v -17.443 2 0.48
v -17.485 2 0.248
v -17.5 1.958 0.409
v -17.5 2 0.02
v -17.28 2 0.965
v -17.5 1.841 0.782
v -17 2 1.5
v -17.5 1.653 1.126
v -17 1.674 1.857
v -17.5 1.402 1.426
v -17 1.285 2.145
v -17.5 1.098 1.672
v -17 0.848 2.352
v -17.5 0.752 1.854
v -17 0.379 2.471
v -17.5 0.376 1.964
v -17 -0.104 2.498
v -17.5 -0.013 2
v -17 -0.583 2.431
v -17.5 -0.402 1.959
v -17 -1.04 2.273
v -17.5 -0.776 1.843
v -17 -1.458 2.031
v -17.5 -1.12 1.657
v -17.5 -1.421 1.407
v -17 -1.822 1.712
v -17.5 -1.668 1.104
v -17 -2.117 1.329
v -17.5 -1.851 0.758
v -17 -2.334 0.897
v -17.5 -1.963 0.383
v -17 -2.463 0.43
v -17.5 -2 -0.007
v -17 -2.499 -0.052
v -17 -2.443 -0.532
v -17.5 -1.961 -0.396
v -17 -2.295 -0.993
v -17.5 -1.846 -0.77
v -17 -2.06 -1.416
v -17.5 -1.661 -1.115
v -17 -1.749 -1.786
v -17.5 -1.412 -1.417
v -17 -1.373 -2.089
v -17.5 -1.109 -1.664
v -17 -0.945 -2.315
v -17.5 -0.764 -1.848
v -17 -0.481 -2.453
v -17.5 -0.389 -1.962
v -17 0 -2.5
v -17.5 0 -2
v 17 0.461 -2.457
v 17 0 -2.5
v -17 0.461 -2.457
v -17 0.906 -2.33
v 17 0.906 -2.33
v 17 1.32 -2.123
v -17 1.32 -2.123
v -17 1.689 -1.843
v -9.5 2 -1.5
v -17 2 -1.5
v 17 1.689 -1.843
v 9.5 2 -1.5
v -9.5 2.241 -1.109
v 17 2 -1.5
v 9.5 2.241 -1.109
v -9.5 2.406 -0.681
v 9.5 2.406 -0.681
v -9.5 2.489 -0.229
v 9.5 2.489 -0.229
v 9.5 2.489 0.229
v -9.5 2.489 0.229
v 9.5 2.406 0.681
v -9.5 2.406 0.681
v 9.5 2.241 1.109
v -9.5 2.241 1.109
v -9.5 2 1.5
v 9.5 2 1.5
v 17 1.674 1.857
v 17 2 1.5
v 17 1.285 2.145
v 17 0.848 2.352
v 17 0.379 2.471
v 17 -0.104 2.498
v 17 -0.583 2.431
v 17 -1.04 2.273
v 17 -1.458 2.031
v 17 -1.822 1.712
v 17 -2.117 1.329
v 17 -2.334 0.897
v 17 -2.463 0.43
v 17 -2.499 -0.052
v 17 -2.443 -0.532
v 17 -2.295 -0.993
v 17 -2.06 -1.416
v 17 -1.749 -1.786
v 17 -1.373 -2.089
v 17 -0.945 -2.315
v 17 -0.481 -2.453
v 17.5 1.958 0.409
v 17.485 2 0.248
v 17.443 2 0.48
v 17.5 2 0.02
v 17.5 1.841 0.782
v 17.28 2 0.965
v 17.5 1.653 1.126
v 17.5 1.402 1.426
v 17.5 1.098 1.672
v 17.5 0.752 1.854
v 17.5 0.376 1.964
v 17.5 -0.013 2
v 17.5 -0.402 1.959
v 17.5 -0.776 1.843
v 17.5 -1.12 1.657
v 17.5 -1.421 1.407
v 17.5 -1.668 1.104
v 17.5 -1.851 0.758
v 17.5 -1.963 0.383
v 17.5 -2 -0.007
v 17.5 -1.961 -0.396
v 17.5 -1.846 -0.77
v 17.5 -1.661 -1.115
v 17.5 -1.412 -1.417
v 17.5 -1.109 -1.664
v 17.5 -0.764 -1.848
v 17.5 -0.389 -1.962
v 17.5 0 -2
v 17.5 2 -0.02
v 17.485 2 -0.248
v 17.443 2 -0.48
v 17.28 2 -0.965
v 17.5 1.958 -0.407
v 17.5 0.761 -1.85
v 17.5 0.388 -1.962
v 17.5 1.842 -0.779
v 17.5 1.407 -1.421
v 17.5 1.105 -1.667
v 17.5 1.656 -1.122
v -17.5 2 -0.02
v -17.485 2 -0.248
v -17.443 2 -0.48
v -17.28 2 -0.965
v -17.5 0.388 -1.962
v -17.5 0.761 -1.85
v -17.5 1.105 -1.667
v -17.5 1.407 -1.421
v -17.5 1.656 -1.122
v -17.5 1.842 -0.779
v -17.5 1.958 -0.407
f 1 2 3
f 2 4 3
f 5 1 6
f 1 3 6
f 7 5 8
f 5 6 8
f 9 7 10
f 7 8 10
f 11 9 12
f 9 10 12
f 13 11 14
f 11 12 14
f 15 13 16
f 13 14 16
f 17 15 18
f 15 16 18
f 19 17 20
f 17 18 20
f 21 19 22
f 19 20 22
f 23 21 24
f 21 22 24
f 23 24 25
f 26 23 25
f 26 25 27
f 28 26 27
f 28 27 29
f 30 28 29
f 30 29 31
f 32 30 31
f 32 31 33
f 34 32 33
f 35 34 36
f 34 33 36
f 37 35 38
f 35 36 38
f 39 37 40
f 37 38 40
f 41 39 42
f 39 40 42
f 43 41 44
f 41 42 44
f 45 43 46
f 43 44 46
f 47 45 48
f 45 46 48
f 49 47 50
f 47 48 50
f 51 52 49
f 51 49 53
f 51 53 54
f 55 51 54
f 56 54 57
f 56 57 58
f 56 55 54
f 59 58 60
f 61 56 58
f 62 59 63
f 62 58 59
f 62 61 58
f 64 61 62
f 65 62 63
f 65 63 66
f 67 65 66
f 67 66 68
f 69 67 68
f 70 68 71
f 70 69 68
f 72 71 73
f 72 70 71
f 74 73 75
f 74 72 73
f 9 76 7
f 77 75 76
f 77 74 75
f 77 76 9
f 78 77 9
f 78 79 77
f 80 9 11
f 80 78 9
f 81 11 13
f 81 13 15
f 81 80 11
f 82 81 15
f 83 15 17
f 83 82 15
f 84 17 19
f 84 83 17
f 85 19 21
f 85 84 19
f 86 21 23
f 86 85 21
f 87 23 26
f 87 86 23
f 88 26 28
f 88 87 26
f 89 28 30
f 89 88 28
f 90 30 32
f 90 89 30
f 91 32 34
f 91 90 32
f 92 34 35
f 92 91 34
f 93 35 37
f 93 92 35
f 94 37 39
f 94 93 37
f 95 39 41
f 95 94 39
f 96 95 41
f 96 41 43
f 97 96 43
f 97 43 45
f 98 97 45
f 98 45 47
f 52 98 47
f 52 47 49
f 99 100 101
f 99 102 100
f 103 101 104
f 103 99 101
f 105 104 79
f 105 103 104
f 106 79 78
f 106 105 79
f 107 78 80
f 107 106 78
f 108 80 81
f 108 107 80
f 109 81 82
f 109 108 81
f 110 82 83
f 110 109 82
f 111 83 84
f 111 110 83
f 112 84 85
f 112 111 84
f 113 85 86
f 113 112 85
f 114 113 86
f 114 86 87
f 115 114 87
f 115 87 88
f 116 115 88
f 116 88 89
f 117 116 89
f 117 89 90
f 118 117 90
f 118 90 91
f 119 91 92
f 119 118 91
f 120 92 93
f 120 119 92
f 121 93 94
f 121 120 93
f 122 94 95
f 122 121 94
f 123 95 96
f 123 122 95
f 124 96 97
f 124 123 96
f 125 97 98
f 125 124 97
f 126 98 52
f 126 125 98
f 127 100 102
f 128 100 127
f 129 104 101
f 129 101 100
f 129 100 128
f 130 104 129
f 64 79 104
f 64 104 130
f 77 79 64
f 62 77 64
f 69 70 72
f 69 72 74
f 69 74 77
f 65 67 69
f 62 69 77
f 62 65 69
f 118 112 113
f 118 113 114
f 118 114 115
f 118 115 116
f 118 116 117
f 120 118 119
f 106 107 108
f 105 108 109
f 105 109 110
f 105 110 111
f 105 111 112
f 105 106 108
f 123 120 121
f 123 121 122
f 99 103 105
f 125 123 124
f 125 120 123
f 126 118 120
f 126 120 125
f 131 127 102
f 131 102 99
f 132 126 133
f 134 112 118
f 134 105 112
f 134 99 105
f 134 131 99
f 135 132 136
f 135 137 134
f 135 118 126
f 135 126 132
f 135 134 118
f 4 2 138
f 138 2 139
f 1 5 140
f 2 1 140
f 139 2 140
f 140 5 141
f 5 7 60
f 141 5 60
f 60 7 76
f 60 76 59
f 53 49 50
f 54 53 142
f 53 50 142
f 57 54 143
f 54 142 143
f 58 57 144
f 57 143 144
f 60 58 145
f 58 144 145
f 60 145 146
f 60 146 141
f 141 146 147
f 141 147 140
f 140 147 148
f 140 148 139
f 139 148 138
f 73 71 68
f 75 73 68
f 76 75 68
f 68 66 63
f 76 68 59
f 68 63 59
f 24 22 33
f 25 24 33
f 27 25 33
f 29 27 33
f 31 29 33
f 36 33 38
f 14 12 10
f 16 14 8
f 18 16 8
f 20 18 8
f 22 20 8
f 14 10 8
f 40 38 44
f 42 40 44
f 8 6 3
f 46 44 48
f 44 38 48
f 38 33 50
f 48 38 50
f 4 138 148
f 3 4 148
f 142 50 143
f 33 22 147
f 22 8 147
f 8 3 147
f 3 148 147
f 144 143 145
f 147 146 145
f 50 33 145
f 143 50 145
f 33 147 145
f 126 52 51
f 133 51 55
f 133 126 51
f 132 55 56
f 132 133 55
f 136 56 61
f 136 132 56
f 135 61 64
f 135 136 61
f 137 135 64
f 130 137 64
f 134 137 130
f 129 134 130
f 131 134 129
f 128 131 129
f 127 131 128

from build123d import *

# Parameters (mm, degrees)
SKETCH1_R           = 2.5
BOSS_EXTRUDE1_DEPTH = 17.5
SKETCH2_W           = 7.702473448
SKETCH2_H           = 1.959232648
CUT_EXTRUDE1_DEPTH  = 28.230497608
CHAMFER4_SIZE       = 0.5
CHAMFER5_SIZE       = 0.5


with BuildPart() as part:
    # Sketch1 → Boss-Extrude1 (new, symmetric)
    with BuildSketch(Plane(origin=(0, 0, 0), x_dir=(0, 0, -1), z_dir=(1, 0, 0))):
        Circle(SKETCH1_R)
    extrude(amount=BOSS_EXTRUDE1_DEPTH, both=True)

    # Sketch2 → Cut-Extrude1 (cut, through all)
    with BuildSketch(Plane(origin=(9.5, 0, 0), x_dir=(0, 0, -1), z_dir=(1, 0, 0))):
        with Locations((0.148863265, 2.979616324)):
            Rectangle(SKETCH2_W, SKETCH2_H)
    cut_extrude1 = extrude(amount=CUT_EXTRUDE1_DEPTH, mode=Mode.SUBTRACT)

    # Mirror1: Cut-Extrude1 across plane
    add(cut_extrude1.mirror(Plane(origin=(0, 0, 0), x_dir=(0, 0, 1), z_dir=(1, 0, 0))), mode=Mode.SUBTRACT)

    # Chamfer4
    chamfer4_edges = [part.edges().sort_by_distance(p)[0] for p in [
        (17.5, -2.236067977, 1.118033989),
    ]]
    chamfer(chamfer4_edges, length=CHAMFER4_SIZE - 0.0001)  # a hair under: the kernel refuses the full size

    # Chamfer5
    chamfer5_edges = [part.edges().sort_by_distance(p)[0] for p in [
        (-17.5, -2.236067977, 1.118033989),
    ]]
    chamfer(chamfer5_edges, length=CHAMFER5_SIZE - 0.0001)  # a hair under: the kernel refuses the full size


solid = part.part
